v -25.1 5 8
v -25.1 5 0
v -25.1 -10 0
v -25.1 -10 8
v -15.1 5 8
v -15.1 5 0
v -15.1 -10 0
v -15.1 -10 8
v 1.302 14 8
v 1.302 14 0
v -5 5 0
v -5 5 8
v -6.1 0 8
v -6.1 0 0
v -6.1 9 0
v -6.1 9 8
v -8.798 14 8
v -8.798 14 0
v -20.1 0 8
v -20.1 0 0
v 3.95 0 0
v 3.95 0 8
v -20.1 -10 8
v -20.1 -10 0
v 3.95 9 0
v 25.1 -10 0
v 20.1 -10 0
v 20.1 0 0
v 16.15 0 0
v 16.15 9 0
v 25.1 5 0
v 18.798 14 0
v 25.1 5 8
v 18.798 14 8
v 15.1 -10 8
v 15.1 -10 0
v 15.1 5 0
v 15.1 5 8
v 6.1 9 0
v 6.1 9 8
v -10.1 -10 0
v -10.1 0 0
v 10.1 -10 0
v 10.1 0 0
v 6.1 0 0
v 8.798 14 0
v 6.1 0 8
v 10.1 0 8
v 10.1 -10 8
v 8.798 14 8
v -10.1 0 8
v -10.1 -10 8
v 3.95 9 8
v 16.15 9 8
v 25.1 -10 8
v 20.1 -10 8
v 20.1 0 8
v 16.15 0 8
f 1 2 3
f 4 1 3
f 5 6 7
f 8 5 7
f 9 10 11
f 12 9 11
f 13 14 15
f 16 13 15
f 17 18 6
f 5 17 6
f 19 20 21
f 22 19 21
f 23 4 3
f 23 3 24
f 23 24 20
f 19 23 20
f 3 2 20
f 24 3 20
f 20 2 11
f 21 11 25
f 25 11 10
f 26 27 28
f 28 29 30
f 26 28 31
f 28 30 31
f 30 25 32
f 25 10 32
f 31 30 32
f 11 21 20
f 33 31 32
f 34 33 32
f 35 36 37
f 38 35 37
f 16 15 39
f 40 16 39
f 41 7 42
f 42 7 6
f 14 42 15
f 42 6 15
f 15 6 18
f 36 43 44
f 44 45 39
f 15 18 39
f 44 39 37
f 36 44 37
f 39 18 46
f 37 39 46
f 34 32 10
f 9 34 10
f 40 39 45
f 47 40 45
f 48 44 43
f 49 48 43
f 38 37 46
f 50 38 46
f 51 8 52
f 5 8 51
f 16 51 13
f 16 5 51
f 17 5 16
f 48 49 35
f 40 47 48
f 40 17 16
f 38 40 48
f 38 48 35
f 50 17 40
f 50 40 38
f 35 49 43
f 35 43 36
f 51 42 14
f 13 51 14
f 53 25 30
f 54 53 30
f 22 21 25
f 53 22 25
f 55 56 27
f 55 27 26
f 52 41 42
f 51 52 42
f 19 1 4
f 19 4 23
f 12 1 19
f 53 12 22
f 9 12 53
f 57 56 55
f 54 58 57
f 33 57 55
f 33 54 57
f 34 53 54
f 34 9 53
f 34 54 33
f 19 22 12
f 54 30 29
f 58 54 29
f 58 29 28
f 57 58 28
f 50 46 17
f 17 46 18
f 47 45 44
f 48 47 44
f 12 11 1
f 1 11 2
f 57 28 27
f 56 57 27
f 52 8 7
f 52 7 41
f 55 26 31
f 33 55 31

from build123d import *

# Parameters (mm, degrees)
PAD_DEPTH    = 8
PAD001_DEPTH = 8


with BuildPart() as body:
    # Sketch → Pad (new body)
    with BuildSketch(Plane.XY):
        Polygon((3.95, 0), (3.95, 9), (16.15, 9), (16.15, 0), (20.1, 0), (20.1, -10), (25.1, -10), (25.1, 5), (18.798132, 14), (1.301868, 14), (-5, 5), (-25.1, 5), (-25.1, -10), (-20.1, -10), (-20.1, 0), (0, 0), align=None)
    extrude(amount=PAD_DEPTH)


with BuildPart() as body001:
    # Sketch001 → Pad001 (new body)
    with BuildSketch(Plane.XY):
        Polygon((-6.1, 0), (-6.1, 9), (6.1, 9), (6.1, 0), (10.1, 0), (10.1, -10), (15.1, -10), (15.1, 5), (8.798132, 14), (-8.798132, 14), (-15.1, 5), (-15.1, -10), (-10.1, -10), (-10.1, 0), align=None)
    extrude(amount=PAD001_DEPTH)


solid = Compound([body.part, body001.part])
